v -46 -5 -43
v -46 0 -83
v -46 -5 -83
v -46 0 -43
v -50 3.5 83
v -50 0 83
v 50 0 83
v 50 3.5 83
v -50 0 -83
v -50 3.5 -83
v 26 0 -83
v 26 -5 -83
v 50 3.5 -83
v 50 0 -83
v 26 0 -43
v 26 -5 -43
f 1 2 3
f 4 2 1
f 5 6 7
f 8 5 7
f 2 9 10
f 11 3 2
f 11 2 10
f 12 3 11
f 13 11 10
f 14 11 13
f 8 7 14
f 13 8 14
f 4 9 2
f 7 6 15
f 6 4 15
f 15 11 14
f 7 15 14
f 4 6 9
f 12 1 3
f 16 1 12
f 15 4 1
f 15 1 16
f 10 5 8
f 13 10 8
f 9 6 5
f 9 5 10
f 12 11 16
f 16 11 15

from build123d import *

# Parameters (mm, degrees)
SKETCH1_W           = 100
SKETCH1_H           = 166
MAIN_BODY_DEPTH     = 3.5
SKETCH2_W           = 72
SKETCH2_H           = 40
PCBS_AND_SUCH_DEPTH = 5


with BuildPart() as part:
    # Sketch1 → MAIN BODY (new body)
    with BuildSketch(Plane(origin=(0, 0, 0), x_dir=(1, 0, 0), z_dir=(0, 1, 0))):
        Rectangle(SKETCH1_W, SKETCH1_H)
    extrude(amount=MAIN_BODY_DEPTH)

    # Sketch2 → PCBs AND SUCH (add)
    with BuildSketch(Plane.XZ):
        with Locations((-10, -63)):
            Rectangle(SKETCH2_W, SKETCH2_H)
    extrude(amount=PCBS_AND_SUCH_DEPTH)


solid = part.part
